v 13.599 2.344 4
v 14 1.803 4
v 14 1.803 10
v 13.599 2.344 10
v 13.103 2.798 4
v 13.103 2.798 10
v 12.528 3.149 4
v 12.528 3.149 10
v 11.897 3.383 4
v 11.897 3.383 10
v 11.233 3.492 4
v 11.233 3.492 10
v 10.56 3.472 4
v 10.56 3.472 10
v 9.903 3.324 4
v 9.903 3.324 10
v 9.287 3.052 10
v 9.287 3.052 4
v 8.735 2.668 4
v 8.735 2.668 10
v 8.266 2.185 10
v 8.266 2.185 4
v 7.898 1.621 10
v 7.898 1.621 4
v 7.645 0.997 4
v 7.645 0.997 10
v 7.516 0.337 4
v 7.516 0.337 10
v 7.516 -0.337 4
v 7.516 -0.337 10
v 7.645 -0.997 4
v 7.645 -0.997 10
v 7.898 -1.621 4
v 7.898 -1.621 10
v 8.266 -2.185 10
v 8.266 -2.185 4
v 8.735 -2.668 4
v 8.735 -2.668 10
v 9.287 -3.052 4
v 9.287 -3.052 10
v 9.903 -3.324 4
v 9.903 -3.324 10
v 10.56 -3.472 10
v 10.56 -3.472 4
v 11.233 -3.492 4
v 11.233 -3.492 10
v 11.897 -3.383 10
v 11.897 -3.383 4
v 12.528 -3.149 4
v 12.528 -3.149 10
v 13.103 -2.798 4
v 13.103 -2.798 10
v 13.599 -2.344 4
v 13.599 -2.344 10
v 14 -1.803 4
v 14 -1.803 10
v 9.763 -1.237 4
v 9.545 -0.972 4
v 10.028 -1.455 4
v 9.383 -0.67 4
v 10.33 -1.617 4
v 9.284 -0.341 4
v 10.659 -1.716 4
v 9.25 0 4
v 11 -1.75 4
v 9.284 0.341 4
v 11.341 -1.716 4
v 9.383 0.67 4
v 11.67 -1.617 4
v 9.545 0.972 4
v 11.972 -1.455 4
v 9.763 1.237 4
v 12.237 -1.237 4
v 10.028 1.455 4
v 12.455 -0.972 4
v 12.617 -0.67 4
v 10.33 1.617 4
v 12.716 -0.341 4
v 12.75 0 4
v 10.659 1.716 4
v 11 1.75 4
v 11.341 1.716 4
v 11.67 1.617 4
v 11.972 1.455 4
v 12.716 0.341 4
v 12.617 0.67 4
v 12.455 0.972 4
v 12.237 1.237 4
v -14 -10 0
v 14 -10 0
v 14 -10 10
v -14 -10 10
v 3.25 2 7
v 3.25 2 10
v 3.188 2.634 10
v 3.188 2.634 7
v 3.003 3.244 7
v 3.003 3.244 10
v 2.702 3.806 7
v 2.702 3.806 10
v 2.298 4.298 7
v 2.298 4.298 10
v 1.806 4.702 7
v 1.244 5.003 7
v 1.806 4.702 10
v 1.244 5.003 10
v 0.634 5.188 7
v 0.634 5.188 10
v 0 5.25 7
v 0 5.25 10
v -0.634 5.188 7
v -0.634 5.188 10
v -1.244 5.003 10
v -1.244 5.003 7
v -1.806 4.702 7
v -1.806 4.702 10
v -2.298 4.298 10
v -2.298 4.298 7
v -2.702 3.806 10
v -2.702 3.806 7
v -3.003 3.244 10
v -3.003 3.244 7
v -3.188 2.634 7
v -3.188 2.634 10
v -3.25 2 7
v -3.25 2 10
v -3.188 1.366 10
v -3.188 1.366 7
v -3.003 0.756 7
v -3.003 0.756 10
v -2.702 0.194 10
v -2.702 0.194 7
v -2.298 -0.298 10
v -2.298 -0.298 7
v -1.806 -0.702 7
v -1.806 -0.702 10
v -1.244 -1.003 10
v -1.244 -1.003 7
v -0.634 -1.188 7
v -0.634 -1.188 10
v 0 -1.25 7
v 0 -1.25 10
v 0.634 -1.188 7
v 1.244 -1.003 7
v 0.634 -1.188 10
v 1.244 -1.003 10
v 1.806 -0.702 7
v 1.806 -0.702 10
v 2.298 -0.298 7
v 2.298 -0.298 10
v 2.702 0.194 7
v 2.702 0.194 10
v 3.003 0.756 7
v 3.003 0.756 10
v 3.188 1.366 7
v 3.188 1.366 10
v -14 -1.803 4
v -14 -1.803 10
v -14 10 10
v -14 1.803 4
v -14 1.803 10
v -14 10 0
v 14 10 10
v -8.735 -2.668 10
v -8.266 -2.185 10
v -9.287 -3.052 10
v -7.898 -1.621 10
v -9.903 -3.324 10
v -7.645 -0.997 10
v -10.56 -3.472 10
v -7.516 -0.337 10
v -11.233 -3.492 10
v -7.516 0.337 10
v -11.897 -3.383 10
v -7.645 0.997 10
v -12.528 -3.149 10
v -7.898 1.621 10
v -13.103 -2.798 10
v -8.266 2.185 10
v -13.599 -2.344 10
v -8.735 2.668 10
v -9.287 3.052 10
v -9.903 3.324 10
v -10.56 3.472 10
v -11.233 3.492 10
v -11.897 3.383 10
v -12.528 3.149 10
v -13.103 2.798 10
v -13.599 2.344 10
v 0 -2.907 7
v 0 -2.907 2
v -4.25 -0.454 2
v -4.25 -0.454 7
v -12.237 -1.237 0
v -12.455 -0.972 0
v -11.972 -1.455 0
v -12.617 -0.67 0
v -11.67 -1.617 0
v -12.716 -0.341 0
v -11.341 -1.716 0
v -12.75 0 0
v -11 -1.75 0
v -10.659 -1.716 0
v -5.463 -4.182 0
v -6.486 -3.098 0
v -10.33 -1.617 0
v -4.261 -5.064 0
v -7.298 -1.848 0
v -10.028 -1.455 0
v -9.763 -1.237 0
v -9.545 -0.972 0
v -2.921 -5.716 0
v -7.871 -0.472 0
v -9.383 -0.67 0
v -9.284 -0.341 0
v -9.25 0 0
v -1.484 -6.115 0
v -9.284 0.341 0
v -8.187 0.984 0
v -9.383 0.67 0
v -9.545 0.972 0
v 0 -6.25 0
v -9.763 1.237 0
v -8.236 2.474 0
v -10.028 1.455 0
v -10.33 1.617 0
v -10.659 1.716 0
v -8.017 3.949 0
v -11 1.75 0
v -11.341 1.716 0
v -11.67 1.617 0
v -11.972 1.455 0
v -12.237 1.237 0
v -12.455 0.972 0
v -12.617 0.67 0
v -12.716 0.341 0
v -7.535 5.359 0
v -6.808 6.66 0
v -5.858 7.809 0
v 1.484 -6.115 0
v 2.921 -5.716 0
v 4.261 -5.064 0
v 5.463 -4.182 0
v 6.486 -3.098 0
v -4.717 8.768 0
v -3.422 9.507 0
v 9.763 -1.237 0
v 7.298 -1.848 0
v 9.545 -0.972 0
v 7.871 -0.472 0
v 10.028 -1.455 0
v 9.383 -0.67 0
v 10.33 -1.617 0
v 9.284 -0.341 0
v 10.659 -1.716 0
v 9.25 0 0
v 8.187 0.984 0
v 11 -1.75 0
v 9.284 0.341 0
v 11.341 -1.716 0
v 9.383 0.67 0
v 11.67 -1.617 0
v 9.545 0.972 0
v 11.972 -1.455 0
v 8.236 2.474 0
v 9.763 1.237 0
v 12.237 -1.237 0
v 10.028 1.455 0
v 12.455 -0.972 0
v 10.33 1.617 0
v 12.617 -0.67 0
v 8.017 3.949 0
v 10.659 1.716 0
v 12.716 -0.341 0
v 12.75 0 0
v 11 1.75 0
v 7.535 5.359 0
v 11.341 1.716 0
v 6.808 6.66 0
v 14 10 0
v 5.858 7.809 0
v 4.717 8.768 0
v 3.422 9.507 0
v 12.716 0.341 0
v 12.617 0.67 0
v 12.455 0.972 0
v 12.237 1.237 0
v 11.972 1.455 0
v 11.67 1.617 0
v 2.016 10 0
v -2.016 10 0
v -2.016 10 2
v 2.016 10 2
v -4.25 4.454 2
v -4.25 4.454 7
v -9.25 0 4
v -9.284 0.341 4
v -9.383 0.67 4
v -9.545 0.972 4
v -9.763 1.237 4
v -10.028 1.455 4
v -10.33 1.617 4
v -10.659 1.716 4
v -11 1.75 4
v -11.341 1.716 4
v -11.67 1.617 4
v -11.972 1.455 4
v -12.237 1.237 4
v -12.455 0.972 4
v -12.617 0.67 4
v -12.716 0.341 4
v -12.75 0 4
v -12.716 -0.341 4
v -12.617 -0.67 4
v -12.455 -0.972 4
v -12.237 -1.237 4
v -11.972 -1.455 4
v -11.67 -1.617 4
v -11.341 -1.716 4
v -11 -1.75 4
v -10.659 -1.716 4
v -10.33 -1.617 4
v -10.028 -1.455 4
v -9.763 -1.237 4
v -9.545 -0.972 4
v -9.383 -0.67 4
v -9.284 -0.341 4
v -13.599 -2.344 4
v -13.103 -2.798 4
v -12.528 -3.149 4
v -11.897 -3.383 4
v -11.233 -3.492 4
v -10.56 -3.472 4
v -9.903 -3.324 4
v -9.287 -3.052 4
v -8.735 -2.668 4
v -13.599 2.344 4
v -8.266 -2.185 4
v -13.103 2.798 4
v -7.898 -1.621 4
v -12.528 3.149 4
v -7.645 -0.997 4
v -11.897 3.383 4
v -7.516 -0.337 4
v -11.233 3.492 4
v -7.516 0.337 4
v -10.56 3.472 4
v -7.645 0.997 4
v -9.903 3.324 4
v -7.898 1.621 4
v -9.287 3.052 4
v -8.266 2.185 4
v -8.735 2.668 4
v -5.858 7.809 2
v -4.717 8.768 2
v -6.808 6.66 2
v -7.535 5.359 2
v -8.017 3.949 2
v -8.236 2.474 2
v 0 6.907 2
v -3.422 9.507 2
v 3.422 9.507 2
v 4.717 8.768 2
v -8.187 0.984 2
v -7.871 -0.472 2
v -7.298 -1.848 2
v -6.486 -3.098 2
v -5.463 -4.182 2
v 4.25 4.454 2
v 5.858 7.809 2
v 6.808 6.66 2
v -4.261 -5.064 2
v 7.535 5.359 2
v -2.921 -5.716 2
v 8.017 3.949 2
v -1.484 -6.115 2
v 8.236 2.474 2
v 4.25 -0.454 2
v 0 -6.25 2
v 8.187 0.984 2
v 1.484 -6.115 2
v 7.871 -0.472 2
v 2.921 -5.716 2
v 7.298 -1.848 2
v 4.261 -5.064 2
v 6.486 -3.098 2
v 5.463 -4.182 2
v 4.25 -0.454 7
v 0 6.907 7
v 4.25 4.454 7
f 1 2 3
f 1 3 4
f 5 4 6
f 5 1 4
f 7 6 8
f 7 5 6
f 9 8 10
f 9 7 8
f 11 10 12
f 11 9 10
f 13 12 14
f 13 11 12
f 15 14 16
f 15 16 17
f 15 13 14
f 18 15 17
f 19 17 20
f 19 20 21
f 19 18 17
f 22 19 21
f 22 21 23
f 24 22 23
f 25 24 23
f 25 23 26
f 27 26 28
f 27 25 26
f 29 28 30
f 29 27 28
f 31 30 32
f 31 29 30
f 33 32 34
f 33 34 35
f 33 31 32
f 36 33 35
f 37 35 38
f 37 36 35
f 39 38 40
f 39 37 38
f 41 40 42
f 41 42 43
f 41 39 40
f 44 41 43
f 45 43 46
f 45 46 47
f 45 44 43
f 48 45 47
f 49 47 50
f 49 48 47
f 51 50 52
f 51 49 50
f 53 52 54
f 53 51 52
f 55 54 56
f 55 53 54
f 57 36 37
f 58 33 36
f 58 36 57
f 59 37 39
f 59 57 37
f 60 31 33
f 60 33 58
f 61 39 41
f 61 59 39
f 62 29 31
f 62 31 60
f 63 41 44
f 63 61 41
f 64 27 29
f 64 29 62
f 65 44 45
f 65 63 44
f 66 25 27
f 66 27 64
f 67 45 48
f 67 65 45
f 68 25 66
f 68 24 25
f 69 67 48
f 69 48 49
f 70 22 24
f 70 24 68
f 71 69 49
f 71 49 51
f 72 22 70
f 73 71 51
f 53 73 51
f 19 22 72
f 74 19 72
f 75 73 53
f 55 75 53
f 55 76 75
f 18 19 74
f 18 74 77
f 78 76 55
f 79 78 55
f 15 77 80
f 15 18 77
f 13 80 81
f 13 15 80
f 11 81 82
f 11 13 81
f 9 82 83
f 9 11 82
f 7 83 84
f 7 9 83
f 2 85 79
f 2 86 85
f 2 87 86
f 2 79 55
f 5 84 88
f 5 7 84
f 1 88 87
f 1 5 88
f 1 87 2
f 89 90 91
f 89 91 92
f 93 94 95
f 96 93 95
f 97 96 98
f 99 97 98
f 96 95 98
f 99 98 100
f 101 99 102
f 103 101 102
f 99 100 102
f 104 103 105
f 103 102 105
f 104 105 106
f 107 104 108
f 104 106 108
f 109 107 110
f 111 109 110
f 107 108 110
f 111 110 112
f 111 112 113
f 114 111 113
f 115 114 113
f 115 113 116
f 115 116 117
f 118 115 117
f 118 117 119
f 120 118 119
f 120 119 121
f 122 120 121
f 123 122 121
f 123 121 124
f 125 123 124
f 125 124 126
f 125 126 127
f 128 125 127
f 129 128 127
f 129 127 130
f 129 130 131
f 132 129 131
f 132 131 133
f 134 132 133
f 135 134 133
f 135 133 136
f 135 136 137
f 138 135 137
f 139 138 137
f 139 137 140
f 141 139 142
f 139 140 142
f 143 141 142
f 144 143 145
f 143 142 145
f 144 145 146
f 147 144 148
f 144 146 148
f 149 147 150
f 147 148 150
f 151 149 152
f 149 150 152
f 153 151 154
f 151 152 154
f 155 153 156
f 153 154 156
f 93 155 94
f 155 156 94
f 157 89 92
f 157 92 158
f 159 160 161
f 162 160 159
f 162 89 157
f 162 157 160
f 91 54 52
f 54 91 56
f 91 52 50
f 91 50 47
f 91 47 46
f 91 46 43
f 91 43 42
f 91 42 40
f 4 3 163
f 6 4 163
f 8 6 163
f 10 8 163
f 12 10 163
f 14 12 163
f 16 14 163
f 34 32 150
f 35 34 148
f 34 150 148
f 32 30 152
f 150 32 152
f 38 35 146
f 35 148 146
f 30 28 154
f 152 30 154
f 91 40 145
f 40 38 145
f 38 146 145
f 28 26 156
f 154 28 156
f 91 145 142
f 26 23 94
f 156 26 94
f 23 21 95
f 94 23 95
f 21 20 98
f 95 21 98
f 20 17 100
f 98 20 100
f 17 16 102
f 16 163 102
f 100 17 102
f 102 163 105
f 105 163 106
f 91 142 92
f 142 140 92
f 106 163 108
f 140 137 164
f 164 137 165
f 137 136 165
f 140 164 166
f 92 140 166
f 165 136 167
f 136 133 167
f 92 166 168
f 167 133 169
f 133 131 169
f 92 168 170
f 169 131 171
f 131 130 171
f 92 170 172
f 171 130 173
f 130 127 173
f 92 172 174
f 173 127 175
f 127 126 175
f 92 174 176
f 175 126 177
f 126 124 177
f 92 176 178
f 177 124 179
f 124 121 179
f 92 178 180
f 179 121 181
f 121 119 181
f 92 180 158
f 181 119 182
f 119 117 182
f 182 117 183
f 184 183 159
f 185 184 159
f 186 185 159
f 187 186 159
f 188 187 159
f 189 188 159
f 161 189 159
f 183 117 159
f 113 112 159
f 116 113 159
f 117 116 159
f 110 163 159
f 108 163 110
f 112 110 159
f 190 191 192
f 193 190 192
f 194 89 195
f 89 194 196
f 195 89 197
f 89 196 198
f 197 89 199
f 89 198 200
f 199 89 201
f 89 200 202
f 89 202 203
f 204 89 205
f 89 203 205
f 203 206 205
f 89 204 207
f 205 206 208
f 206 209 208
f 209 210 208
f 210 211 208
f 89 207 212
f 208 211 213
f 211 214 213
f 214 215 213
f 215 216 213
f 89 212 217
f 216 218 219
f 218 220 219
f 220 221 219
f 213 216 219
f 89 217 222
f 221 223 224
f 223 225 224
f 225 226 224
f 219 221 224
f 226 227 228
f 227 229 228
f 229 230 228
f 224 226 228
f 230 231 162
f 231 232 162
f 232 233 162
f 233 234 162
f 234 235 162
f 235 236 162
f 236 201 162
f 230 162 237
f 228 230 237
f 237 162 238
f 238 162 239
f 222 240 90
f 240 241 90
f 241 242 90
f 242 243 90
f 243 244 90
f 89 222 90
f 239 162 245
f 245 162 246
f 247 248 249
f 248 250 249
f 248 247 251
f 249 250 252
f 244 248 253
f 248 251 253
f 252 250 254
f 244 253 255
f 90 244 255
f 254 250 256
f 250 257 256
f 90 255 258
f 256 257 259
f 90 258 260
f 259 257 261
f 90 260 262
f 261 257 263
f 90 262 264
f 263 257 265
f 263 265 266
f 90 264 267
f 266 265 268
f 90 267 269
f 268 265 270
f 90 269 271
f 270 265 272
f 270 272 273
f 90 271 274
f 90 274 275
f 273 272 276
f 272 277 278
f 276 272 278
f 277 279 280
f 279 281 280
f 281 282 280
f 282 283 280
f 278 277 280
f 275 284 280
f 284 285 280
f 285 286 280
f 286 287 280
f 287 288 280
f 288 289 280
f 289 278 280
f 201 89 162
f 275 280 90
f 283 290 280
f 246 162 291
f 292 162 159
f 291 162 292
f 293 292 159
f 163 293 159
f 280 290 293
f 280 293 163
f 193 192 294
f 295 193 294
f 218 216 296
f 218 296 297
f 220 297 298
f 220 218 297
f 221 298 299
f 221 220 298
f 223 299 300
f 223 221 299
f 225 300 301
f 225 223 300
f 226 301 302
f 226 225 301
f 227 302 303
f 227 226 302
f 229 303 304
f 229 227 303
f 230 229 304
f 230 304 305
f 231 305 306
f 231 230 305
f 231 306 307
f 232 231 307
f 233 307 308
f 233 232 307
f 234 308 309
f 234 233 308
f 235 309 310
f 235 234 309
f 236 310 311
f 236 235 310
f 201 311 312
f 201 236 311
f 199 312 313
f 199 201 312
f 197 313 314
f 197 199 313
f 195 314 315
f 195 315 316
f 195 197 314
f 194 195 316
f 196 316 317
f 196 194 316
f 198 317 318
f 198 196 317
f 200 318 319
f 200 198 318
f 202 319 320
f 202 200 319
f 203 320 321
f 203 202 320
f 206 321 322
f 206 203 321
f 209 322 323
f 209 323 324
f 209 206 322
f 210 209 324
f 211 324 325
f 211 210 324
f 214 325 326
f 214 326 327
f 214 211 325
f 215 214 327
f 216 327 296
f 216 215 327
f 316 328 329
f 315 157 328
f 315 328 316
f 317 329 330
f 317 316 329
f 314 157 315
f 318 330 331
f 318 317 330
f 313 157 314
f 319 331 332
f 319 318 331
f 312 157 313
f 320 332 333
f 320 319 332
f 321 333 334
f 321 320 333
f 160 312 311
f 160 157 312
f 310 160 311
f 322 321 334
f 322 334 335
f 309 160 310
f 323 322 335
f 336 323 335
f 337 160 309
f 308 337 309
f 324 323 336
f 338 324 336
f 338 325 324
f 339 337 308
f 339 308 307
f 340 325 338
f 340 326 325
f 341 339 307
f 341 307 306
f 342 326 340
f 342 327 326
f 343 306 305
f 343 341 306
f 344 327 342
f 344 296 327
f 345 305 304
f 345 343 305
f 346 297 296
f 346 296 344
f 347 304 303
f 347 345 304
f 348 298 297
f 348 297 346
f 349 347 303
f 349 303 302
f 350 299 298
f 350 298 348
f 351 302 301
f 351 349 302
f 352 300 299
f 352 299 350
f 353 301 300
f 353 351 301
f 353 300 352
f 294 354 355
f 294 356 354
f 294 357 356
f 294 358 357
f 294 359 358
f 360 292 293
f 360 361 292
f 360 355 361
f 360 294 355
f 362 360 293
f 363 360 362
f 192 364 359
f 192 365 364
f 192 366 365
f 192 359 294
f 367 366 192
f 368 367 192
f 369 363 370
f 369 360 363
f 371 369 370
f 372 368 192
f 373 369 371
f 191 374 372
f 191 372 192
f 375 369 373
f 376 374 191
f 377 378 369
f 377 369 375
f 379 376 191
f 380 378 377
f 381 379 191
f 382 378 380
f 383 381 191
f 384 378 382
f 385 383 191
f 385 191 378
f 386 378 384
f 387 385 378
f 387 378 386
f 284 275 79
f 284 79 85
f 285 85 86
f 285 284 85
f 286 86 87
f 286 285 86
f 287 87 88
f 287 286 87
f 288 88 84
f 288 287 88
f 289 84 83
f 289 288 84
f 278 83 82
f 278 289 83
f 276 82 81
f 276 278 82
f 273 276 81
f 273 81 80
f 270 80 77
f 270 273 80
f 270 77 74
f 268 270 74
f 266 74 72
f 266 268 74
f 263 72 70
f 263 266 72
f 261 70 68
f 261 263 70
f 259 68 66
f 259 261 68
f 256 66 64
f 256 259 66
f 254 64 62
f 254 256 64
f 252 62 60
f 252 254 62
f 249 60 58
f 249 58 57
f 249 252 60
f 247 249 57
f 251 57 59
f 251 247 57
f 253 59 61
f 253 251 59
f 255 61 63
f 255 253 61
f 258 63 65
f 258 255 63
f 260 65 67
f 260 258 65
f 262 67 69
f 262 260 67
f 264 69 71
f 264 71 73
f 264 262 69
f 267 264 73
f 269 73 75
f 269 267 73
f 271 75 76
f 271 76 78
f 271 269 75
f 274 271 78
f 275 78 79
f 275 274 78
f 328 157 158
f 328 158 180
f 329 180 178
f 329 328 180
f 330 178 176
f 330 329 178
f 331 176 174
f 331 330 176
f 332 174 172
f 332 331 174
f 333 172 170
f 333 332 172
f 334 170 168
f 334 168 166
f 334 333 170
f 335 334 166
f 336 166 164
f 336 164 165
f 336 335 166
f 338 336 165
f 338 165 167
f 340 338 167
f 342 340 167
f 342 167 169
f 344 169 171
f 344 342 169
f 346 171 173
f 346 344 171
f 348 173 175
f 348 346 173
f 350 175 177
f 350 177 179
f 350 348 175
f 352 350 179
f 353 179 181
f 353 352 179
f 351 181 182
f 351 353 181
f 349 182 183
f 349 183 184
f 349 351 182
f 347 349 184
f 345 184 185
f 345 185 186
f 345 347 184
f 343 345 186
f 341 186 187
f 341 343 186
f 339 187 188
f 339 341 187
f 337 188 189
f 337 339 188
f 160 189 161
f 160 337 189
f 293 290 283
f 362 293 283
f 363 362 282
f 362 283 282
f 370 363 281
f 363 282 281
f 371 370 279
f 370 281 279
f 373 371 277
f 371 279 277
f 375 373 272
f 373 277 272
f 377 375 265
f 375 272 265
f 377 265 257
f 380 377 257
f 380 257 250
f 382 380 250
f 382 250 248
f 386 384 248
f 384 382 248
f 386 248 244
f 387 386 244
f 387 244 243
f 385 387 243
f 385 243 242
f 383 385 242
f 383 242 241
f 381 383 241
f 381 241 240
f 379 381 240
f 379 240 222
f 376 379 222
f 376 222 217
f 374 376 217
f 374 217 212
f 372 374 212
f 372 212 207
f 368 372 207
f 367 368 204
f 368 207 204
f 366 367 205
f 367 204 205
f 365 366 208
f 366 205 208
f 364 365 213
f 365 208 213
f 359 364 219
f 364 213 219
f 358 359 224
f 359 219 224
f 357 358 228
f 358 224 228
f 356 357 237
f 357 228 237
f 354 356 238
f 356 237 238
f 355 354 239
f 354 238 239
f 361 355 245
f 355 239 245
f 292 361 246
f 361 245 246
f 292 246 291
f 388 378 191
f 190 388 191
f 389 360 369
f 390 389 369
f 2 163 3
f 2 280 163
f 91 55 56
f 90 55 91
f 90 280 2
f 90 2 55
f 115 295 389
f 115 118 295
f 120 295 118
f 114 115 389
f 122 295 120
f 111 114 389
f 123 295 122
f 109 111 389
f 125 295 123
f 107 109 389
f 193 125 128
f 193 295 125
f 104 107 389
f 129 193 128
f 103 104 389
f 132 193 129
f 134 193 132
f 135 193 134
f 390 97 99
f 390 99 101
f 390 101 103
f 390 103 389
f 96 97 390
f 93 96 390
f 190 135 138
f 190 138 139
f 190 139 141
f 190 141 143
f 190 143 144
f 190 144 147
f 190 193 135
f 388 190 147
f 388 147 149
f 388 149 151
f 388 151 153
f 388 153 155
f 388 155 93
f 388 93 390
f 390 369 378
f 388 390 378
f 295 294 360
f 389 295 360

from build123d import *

# Parameters (mm, degrees)
SKETCH_W        = 28
SKETCH_H        = 20
SKETCH_R        = 1.75
PAD_DEPTH       = 4
PAD001_DEPTH    = 6
SKETCH002_R     = 3.25
POCKET_DEPTH    = 10
POCKET001_DEPTH = 7
SKETCH004_R     = 8.25
POCKET002_DEPTH = 2


with BuildPart() as part:
    # Sketch → Pad (new body)
    with BuildSketch(Plane.XY):
        Rectangle(SKETCH_W, SKETCH_H)
        with Locations((-11, 0)):
            Circle(SKETCH_R, mode=Mode.SUBTRACT)
        with Locations((11, 0)):
            Circle(SKETCH_R, mode=Mode.SUBTRACT)
    extrude(amount=PAD_DEPTH)

    # Sketch001 (on Face8 of Pad) → Pad001 (join)
    with BuildSketch(Plane.XY.offset(4)):
        with BuildLine():
            ThreePointArc((14, 1.802776), (7.5, 0), (14, -1.802776))
            Line((14, -1.802776), (14, -10))
            Line((14, -10), (-14, -10))
            Line((-14, -10), (-14, -1.802776))
            ThreePointArc((-14, -1.802776), (-7.5, 0), (-14, 1.802776))
            Line((-14, 1.802776), (-14, 10))
            Line((-14, 10), (14, 10))
            Line((14, 10), (14, 1.802776))
        make_face()
    extrude(amount=PAD001_DEPTH)

    # Sketch002 (on Face15 of Pad001) → Pocket (cut)
    with BuildSketch(Plane.XY.offset(10)):
        with Locations((0, 2)):
            Circle(SKETCH002_R)
    extrude(amount=-POCKET_DEPTH, mode=Mode.SUBTRACT)

    # Sketch003 (on Face4 of Pocket) → Pocket001 (cut)
    with BuildSketch(Plane(origin=(0, 0, 0), x_dir=(1, 0, 0), z_dir=(0, 0, -1))):
        Polygon((4.25, -4.453739), (4.25, 0.453739), (0, 2.907477), (-4.25, 0.453739), (-4.25, -4.453739), (0, -6.907477), align=None)
    extrude(amount=-POCKET001_DEPTH, mode=Mode.SUBTRACT)

    # Sketch004 (on Face4 of Pocket001) → Pocket002 (cut)
    with BuildSketch(Plane(origin=(0, 0, 0), x_dir=(1, 0, 0), z_dir=(0, 0, -1))):
        with Locations((0, -2)):
            Circle(SKETCH004_R)
    extrude(amount=-POCKET002_DEPTH, mode=Mode.SUBTRACT)


solid = part.part
